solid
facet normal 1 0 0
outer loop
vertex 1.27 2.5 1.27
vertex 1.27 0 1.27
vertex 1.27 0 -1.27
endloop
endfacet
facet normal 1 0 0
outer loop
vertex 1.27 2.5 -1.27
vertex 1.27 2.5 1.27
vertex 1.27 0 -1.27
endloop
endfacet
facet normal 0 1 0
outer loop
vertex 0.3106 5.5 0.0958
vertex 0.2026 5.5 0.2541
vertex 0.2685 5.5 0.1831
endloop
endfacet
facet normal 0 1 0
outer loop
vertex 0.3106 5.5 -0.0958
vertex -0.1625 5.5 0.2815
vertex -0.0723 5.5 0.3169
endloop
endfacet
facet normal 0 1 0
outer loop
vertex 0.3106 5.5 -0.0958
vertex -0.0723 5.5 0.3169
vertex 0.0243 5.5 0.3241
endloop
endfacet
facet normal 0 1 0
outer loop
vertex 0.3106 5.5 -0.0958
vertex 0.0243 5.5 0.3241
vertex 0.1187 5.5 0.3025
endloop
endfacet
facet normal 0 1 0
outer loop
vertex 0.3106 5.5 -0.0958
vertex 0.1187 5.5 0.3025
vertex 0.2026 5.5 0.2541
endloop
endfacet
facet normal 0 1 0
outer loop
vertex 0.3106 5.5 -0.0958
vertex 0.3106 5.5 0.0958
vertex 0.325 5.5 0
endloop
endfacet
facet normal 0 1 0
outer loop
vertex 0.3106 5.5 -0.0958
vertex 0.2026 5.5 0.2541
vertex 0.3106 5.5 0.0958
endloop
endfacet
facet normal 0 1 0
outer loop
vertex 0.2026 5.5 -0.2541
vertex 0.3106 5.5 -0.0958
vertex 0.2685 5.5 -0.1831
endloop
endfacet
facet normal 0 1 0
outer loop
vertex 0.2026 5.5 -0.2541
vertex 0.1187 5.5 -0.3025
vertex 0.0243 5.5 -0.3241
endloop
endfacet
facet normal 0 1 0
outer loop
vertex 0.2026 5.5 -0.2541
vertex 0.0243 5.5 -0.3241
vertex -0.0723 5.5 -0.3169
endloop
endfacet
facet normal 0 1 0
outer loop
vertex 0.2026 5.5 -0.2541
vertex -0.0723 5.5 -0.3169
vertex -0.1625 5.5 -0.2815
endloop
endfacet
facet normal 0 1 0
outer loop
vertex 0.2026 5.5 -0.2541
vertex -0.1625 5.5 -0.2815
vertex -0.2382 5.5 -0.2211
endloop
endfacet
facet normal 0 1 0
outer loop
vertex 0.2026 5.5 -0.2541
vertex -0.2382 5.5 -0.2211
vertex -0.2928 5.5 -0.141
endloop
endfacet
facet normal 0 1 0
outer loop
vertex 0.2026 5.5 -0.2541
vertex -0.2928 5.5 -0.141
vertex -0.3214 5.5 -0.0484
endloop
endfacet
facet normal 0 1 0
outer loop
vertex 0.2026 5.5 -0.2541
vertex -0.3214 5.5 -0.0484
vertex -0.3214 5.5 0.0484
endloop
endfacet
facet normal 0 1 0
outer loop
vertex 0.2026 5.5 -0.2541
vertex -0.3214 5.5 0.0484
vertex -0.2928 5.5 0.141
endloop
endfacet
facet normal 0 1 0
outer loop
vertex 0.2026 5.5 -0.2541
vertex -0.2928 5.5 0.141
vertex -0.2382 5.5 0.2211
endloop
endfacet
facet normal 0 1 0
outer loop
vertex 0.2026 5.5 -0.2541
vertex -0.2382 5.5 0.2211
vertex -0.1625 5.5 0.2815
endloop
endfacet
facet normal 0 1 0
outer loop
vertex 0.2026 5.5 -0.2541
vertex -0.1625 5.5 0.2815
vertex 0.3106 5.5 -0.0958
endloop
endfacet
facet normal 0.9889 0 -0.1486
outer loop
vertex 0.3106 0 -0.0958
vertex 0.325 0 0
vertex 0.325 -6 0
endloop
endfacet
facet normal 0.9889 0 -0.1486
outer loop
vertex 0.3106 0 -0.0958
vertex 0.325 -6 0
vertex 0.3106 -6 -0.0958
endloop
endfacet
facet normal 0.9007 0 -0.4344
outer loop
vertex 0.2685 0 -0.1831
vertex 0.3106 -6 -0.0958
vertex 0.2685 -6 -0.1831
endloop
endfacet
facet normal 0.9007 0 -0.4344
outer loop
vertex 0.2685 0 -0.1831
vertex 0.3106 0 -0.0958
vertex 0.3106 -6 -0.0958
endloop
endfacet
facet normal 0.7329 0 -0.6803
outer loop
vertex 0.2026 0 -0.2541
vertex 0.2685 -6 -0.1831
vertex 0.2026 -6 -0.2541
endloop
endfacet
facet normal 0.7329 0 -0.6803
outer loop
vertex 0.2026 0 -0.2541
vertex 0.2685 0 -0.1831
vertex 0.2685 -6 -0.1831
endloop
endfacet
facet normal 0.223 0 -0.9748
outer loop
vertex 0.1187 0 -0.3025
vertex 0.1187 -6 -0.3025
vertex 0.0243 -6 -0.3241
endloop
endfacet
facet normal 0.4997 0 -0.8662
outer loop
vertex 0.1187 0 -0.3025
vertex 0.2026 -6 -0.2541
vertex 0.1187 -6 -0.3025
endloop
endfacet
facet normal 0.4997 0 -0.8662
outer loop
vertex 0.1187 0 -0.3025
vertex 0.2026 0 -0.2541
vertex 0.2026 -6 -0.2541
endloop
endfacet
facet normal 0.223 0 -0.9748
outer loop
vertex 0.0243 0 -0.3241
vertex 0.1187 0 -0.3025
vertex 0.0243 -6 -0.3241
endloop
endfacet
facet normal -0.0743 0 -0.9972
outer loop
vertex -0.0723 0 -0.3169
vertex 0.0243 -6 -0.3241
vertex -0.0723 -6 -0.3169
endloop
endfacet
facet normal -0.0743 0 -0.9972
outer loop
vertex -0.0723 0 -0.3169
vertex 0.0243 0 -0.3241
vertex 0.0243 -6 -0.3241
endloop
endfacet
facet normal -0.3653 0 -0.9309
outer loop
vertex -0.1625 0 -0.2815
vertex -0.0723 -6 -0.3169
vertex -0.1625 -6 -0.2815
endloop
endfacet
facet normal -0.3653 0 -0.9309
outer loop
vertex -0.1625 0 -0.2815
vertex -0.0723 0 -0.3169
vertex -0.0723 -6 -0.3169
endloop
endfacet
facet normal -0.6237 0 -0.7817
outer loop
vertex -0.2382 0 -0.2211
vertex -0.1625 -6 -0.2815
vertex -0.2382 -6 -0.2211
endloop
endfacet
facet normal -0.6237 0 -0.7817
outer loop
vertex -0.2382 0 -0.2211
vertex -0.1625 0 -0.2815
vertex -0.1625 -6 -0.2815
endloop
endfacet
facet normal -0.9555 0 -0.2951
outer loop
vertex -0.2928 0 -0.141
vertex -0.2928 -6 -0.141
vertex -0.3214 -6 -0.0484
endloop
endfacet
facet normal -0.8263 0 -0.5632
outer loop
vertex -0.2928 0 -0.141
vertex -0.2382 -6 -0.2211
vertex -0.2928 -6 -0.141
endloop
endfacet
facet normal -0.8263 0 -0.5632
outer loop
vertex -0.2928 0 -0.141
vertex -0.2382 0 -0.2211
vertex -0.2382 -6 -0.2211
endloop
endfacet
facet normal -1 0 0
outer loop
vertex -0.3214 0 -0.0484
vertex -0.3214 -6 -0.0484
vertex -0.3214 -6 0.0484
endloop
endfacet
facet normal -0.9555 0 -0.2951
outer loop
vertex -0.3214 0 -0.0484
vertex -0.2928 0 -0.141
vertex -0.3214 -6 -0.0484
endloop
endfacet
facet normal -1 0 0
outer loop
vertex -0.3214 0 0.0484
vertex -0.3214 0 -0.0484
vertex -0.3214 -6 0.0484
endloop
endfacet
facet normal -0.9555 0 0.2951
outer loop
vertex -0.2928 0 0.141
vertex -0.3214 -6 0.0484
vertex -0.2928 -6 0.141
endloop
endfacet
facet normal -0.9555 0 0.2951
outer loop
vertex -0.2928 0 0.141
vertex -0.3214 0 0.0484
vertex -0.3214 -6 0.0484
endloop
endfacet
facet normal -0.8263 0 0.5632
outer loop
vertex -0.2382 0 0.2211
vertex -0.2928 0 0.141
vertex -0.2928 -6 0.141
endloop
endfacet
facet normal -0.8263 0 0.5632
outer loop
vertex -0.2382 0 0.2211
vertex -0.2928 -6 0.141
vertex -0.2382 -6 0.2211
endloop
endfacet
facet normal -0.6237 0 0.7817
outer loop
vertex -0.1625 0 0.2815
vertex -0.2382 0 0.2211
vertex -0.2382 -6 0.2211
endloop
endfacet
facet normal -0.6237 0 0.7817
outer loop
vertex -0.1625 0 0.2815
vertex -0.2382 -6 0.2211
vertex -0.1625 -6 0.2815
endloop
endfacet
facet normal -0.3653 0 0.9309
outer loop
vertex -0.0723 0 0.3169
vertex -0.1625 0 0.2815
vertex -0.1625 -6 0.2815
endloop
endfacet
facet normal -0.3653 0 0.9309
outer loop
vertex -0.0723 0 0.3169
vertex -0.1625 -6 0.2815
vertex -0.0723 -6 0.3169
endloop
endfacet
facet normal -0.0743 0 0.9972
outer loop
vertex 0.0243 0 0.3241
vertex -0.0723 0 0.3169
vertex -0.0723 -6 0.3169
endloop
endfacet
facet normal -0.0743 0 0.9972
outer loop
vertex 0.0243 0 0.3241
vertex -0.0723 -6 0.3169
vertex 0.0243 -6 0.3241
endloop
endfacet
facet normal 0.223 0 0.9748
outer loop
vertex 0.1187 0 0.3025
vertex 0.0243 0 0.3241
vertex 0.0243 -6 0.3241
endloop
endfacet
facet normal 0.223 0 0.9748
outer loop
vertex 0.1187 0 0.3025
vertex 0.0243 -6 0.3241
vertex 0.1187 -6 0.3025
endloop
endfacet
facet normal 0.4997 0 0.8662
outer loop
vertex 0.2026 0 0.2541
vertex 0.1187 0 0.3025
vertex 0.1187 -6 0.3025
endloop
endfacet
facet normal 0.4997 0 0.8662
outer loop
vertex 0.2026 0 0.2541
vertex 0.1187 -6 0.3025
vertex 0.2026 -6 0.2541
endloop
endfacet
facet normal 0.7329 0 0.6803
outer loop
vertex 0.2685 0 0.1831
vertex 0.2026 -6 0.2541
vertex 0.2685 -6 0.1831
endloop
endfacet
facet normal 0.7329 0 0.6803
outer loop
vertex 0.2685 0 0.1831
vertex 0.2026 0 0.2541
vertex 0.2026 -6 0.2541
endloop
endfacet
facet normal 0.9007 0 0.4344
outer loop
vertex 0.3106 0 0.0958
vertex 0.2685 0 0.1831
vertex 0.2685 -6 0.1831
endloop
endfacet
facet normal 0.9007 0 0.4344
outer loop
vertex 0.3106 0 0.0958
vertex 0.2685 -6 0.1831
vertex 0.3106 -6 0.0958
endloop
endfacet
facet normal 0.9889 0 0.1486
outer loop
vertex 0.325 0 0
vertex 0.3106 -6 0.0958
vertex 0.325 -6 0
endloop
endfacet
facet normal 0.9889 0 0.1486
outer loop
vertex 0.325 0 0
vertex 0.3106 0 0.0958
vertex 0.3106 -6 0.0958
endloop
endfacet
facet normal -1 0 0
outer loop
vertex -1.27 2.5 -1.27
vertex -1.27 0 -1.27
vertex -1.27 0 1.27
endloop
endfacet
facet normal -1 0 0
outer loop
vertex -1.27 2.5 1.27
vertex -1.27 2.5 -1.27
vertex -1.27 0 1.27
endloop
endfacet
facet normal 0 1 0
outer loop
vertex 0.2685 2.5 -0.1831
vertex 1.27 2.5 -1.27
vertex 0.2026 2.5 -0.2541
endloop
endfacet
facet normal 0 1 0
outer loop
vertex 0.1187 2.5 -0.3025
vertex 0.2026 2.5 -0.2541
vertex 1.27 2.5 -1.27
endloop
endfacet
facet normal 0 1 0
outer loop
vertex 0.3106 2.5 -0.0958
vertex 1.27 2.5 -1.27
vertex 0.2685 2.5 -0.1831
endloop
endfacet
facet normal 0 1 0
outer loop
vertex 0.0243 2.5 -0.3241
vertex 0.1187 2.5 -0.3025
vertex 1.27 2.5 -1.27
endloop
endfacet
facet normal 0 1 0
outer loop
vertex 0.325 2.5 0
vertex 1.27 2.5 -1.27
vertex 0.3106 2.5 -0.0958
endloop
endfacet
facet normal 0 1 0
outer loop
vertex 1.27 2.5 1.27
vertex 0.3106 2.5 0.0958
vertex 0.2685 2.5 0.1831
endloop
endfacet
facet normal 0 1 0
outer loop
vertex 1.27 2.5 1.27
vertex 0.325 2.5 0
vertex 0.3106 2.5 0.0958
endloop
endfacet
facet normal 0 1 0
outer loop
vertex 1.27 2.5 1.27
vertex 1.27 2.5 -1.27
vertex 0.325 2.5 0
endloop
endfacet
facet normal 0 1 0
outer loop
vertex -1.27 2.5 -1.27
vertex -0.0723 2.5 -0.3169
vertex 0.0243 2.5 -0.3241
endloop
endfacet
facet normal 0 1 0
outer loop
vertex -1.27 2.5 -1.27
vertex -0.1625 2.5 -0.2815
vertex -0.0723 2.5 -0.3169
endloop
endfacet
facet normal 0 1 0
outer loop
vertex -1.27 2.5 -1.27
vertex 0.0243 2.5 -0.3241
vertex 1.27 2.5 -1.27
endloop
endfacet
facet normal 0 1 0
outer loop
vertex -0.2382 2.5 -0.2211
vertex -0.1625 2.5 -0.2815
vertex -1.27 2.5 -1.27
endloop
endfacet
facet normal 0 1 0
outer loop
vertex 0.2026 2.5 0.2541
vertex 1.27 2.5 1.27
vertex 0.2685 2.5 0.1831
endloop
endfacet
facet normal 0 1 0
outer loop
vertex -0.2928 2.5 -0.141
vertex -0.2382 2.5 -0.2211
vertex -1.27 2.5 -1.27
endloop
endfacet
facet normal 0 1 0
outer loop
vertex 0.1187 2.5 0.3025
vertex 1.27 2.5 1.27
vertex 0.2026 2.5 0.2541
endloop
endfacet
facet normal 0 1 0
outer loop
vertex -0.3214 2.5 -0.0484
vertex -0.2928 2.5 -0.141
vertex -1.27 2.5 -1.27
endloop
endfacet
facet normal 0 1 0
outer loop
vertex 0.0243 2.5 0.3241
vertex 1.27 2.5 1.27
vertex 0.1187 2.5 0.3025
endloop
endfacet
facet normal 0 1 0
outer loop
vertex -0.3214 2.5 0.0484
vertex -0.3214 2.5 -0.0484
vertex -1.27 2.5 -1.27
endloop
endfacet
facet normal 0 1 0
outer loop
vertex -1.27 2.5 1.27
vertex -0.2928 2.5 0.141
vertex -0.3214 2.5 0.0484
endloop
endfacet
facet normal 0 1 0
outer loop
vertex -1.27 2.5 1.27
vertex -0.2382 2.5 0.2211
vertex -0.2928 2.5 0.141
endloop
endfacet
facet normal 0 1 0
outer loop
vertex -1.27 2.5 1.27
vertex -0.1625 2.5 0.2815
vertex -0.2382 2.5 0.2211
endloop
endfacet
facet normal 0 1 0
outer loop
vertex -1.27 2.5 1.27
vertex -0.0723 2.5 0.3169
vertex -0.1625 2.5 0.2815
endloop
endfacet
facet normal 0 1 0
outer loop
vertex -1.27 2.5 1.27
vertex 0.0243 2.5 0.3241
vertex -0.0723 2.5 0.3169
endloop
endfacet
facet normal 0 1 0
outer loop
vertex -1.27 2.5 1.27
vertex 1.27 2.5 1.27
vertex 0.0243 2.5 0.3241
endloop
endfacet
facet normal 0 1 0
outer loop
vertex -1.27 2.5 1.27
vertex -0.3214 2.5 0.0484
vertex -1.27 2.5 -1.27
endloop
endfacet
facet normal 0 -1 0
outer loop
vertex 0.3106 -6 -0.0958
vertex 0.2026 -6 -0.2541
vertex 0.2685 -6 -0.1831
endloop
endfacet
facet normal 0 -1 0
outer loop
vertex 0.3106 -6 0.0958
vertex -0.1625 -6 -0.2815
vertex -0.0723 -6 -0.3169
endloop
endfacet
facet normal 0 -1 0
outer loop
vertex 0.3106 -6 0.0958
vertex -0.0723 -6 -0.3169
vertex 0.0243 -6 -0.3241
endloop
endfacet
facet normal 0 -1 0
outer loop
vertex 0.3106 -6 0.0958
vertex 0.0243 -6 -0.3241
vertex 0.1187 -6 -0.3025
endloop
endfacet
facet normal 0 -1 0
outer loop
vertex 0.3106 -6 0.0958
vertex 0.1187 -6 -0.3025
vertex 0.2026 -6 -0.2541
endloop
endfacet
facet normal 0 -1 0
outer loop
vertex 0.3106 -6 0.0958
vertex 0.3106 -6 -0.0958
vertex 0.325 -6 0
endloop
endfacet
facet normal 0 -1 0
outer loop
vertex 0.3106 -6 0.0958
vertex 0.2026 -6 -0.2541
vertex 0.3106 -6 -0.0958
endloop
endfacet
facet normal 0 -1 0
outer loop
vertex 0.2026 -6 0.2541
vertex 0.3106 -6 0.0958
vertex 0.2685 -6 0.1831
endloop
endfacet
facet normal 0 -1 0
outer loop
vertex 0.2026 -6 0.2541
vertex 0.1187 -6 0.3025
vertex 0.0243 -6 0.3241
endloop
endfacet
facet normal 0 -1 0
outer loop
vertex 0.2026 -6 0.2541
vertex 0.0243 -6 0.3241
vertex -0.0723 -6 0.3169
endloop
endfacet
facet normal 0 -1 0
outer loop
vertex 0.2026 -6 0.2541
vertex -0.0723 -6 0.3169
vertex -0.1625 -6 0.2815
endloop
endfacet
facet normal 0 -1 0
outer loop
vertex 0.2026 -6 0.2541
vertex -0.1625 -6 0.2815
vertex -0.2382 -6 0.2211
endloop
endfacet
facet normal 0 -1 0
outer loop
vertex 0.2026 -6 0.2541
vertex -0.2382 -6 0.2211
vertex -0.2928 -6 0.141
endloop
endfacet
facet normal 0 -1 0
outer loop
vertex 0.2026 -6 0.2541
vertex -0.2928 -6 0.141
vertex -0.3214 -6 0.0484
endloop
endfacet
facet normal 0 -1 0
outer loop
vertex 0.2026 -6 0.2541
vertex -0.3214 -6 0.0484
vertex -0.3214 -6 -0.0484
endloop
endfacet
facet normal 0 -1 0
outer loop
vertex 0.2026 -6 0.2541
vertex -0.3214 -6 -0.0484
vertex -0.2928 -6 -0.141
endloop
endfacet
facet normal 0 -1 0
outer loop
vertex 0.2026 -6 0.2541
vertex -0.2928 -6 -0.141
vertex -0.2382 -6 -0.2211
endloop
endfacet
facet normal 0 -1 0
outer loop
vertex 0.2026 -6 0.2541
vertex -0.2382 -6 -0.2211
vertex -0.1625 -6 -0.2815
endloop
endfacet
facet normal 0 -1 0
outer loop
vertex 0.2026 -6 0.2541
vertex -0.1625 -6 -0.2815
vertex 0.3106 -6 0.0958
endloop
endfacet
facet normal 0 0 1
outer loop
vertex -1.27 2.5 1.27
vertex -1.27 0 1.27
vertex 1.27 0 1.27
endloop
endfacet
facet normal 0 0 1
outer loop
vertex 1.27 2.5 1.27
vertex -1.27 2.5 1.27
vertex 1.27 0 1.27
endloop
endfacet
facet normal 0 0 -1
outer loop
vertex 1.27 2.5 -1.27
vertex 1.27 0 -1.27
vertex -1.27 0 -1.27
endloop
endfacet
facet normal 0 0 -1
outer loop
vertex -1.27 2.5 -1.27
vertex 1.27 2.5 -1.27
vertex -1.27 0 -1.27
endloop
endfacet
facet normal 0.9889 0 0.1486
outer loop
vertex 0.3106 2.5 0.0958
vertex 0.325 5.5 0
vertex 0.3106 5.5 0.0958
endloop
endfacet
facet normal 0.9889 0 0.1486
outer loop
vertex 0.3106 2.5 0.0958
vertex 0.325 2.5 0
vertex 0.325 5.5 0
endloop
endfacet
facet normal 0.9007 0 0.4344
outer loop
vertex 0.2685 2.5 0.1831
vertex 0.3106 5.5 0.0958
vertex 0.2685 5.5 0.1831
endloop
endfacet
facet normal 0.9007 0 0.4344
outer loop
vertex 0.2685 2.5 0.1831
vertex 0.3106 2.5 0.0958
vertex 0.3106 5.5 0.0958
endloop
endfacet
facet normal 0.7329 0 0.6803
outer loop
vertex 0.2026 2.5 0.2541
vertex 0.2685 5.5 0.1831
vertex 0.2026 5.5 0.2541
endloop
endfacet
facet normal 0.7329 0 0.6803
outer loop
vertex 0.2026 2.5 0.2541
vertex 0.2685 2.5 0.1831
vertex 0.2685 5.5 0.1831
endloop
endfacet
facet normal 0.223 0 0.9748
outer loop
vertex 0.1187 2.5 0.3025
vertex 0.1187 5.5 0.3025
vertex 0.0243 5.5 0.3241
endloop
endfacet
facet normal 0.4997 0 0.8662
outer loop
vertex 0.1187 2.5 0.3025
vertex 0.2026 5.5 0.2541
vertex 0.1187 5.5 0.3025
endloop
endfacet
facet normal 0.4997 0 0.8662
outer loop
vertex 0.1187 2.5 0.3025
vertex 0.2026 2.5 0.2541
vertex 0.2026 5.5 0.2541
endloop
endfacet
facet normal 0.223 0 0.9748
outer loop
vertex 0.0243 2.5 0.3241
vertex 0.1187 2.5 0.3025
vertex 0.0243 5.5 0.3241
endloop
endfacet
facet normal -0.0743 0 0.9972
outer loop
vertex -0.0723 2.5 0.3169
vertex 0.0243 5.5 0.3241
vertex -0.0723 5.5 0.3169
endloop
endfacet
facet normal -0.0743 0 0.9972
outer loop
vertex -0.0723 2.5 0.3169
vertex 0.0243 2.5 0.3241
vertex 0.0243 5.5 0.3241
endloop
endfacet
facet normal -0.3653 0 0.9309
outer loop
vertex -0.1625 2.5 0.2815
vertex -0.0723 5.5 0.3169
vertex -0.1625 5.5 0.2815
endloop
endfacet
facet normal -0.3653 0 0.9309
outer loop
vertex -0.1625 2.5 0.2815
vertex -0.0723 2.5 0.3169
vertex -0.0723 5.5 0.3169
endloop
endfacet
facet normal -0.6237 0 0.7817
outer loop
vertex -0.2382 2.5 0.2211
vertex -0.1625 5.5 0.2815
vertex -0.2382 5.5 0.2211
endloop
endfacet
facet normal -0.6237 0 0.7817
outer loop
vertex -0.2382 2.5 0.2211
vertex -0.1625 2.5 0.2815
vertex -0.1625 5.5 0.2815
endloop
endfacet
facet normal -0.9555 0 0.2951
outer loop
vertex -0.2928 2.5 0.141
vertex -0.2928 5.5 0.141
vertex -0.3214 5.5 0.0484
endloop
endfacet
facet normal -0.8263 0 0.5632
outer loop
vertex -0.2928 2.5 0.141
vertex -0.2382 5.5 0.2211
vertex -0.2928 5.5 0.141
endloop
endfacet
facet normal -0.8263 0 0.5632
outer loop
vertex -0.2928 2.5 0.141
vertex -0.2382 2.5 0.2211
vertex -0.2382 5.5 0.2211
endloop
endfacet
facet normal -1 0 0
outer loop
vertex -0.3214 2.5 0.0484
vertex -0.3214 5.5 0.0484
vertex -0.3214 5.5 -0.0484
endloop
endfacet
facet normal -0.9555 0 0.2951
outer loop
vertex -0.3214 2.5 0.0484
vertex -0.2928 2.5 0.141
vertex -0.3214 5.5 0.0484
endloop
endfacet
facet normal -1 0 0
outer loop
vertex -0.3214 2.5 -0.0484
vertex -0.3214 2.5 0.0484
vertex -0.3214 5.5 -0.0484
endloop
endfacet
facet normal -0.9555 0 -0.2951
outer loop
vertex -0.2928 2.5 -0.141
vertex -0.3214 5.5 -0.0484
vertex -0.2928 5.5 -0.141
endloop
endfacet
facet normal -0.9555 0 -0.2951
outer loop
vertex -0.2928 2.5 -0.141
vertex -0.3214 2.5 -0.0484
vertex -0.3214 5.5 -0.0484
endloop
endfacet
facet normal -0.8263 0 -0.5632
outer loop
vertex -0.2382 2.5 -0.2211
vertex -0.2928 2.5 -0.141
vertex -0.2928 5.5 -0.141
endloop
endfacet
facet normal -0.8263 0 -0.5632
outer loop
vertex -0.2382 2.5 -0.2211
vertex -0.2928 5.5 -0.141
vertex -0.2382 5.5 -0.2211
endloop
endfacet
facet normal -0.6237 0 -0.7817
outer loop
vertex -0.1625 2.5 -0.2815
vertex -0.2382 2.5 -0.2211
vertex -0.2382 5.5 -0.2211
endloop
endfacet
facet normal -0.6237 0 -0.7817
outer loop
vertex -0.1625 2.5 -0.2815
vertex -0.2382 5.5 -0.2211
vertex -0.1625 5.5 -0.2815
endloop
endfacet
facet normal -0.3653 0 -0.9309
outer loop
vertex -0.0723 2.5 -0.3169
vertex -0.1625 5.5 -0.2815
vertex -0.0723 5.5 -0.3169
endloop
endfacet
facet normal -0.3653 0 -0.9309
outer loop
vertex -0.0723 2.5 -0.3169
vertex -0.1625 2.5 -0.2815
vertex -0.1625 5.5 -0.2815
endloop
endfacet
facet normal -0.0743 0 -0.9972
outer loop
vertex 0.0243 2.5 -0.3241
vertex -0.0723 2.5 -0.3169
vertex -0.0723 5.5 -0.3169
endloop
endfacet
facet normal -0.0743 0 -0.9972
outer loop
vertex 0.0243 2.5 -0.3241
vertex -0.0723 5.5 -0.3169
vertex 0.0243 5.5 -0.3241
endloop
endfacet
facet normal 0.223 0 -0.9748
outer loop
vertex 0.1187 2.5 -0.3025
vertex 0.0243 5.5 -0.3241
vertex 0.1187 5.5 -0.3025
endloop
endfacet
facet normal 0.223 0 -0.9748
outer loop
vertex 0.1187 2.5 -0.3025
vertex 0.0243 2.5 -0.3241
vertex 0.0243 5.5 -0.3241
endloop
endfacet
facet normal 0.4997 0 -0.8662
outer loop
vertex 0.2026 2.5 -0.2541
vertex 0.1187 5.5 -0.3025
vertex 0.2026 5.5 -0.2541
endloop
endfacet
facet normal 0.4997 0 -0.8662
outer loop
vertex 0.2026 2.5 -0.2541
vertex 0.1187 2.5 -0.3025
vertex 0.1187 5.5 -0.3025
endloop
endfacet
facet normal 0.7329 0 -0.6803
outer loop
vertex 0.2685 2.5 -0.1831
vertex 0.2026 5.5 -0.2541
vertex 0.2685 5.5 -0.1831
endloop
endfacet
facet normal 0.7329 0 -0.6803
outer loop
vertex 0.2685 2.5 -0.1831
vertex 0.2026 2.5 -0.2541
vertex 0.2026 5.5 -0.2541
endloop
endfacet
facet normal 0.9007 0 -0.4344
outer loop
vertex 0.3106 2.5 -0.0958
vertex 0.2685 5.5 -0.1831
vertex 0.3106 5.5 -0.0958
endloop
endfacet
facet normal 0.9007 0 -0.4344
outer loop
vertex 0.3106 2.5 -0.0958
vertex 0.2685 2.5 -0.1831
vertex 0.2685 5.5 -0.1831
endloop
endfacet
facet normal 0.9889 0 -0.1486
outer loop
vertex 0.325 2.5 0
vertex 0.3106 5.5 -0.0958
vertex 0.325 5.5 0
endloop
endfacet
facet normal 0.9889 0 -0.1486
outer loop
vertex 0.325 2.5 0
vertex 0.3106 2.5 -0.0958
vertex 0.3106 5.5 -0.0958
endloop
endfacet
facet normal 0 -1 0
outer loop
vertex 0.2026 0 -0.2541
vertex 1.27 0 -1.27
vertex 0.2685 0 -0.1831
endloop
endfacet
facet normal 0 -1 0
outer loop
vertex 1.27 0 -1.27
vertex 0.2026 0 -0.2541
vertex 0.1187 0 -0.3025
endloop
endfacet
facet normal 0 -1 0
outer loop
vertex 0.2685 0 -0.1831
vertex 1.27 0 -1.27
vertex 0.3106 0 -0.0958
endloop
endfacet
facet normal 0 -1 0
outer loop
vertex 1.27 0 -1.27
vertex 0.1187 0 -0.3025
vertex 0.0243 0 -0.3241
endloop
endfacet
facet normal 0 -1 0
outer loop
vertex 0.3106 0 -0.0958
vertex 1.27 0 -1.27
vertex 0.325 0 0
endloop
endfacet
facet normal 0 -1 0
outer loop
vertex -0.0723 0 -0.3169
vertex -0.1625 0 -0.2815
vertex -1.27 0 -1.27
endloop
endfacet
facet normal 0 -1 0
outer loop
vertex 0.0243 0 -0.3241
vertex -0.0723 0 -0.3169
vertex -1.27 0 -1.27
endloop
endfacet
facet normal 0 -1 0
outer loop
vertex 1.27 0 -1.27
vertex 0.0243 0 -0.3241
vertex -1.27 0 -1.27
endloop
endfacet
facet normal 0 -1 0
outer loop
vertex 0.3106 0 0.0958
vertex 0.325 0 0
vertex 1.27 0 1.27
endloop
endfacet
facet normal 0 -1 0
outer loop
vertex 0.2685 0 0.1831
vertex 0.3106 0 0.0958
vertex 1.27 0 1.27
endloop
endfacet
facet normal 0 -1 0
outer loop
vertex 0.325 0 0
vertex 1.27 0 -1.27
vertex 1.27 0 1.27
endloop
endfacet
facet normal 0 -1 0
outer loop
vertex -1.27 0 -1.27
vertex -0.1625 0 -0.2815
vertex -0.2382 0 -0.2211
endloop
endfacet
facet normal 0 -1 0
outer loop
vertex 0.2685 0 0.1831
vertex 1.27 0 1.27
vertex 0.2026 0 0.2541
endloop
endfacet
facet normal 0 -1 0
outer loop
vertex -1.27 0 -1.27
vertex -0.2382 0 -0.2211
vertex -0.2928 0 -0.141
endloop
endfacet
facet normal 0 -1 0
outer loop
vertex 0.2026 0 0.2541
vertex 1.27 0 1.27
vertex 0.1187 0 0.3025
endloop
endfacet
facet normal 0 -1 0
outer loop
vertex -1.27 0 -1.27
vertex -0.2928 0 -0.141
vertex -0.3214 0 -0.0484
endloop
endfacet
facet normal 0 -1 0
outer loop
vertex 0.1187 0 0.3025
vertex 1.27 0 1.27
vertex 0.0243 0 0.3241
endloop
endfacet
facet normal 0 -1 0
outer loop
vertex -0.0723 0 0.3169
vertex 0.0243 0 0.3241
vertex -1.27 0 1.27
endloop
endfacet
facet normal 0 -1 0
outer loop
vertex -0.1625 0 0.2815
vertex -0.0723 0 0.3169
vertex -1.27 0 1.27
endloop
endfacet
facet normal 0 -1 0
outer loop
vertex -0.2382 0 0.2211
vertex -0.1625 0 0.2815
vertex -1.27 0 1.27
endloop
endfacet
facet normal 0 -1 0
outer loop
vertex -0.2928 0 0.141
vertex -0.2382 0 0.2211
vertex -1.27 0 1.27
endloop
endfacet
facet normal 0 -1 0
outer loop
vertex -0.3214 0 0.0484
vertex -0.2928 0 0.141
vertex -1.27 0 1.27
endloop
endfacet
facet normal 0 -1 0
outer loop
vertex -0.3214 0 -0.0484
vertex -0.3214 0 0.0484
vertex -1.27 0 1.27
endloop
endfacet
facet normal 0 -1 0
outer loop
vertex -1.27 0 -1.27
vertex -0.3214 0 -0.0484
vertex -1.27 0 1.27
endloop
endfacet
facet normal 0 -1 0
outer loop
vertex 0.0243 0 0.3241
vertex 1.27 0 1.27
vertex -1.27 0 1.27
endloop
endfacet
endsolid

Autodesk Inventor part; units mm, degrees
ref_plane "YZ Plane" through (0, 0, 0) normal (1, 0, 0) x (0, 1, 0)
ref_plane "XZ Plane" through (0, 0, 0) normal (0, 1, 0) x (-1, 0, 0)
ref_plane "XY Plane" through (0, 0, 0) normal (0, 0, 1) x (1, 0, 0)
sketch "Sketch1" plane through (0, 0, 0) normal (0, 1, 0) x (-1, 0, 0)
  line L0 (-1.27, -1.27) -> (1.27, -1.27)
  line L1 (1.27, -1.27) -> (1.27, 1.27)
  line L2 (1.27, 1.27) -> (-1.27, 1.27)
  line L3 (-1.27, 1.27) -> (-1.27, -1.27)
  line L4 (-1.27, -1.27) -> (1.27, 1.27) construction
  line L5 (1.27, -1.27) -> (-1.27, 1.27) construction
  point P0 (0, 0)
  dimension "d0" = 2.54
  dimension "d1" = 2.54
extrude "Extrusion1" add sketch "Sketch1" along normal blind 2.5
sketch "Sketch2" plane through (0, 2.5, 0) normal (0, 1, 0) x (1, 0, 0)
  circle A0 centre (0, 0) radius 0.325
  dimension "d4" = 0.65
extrude "Extrusion2" add sketch "Sketch2" along normal blind 3
sketch "Sketch3" plane through (0, 0, 0) normal (0, -1, 0) x (1, 0, 0)
  circle A0 centre (0, 0) radius 0.325
  dimension "d7" = 0.65
extrude "Extrusion3" add sketch "Sketch3" along normal blind 6
properties part number "pin-header-male" material "Aluminum"
